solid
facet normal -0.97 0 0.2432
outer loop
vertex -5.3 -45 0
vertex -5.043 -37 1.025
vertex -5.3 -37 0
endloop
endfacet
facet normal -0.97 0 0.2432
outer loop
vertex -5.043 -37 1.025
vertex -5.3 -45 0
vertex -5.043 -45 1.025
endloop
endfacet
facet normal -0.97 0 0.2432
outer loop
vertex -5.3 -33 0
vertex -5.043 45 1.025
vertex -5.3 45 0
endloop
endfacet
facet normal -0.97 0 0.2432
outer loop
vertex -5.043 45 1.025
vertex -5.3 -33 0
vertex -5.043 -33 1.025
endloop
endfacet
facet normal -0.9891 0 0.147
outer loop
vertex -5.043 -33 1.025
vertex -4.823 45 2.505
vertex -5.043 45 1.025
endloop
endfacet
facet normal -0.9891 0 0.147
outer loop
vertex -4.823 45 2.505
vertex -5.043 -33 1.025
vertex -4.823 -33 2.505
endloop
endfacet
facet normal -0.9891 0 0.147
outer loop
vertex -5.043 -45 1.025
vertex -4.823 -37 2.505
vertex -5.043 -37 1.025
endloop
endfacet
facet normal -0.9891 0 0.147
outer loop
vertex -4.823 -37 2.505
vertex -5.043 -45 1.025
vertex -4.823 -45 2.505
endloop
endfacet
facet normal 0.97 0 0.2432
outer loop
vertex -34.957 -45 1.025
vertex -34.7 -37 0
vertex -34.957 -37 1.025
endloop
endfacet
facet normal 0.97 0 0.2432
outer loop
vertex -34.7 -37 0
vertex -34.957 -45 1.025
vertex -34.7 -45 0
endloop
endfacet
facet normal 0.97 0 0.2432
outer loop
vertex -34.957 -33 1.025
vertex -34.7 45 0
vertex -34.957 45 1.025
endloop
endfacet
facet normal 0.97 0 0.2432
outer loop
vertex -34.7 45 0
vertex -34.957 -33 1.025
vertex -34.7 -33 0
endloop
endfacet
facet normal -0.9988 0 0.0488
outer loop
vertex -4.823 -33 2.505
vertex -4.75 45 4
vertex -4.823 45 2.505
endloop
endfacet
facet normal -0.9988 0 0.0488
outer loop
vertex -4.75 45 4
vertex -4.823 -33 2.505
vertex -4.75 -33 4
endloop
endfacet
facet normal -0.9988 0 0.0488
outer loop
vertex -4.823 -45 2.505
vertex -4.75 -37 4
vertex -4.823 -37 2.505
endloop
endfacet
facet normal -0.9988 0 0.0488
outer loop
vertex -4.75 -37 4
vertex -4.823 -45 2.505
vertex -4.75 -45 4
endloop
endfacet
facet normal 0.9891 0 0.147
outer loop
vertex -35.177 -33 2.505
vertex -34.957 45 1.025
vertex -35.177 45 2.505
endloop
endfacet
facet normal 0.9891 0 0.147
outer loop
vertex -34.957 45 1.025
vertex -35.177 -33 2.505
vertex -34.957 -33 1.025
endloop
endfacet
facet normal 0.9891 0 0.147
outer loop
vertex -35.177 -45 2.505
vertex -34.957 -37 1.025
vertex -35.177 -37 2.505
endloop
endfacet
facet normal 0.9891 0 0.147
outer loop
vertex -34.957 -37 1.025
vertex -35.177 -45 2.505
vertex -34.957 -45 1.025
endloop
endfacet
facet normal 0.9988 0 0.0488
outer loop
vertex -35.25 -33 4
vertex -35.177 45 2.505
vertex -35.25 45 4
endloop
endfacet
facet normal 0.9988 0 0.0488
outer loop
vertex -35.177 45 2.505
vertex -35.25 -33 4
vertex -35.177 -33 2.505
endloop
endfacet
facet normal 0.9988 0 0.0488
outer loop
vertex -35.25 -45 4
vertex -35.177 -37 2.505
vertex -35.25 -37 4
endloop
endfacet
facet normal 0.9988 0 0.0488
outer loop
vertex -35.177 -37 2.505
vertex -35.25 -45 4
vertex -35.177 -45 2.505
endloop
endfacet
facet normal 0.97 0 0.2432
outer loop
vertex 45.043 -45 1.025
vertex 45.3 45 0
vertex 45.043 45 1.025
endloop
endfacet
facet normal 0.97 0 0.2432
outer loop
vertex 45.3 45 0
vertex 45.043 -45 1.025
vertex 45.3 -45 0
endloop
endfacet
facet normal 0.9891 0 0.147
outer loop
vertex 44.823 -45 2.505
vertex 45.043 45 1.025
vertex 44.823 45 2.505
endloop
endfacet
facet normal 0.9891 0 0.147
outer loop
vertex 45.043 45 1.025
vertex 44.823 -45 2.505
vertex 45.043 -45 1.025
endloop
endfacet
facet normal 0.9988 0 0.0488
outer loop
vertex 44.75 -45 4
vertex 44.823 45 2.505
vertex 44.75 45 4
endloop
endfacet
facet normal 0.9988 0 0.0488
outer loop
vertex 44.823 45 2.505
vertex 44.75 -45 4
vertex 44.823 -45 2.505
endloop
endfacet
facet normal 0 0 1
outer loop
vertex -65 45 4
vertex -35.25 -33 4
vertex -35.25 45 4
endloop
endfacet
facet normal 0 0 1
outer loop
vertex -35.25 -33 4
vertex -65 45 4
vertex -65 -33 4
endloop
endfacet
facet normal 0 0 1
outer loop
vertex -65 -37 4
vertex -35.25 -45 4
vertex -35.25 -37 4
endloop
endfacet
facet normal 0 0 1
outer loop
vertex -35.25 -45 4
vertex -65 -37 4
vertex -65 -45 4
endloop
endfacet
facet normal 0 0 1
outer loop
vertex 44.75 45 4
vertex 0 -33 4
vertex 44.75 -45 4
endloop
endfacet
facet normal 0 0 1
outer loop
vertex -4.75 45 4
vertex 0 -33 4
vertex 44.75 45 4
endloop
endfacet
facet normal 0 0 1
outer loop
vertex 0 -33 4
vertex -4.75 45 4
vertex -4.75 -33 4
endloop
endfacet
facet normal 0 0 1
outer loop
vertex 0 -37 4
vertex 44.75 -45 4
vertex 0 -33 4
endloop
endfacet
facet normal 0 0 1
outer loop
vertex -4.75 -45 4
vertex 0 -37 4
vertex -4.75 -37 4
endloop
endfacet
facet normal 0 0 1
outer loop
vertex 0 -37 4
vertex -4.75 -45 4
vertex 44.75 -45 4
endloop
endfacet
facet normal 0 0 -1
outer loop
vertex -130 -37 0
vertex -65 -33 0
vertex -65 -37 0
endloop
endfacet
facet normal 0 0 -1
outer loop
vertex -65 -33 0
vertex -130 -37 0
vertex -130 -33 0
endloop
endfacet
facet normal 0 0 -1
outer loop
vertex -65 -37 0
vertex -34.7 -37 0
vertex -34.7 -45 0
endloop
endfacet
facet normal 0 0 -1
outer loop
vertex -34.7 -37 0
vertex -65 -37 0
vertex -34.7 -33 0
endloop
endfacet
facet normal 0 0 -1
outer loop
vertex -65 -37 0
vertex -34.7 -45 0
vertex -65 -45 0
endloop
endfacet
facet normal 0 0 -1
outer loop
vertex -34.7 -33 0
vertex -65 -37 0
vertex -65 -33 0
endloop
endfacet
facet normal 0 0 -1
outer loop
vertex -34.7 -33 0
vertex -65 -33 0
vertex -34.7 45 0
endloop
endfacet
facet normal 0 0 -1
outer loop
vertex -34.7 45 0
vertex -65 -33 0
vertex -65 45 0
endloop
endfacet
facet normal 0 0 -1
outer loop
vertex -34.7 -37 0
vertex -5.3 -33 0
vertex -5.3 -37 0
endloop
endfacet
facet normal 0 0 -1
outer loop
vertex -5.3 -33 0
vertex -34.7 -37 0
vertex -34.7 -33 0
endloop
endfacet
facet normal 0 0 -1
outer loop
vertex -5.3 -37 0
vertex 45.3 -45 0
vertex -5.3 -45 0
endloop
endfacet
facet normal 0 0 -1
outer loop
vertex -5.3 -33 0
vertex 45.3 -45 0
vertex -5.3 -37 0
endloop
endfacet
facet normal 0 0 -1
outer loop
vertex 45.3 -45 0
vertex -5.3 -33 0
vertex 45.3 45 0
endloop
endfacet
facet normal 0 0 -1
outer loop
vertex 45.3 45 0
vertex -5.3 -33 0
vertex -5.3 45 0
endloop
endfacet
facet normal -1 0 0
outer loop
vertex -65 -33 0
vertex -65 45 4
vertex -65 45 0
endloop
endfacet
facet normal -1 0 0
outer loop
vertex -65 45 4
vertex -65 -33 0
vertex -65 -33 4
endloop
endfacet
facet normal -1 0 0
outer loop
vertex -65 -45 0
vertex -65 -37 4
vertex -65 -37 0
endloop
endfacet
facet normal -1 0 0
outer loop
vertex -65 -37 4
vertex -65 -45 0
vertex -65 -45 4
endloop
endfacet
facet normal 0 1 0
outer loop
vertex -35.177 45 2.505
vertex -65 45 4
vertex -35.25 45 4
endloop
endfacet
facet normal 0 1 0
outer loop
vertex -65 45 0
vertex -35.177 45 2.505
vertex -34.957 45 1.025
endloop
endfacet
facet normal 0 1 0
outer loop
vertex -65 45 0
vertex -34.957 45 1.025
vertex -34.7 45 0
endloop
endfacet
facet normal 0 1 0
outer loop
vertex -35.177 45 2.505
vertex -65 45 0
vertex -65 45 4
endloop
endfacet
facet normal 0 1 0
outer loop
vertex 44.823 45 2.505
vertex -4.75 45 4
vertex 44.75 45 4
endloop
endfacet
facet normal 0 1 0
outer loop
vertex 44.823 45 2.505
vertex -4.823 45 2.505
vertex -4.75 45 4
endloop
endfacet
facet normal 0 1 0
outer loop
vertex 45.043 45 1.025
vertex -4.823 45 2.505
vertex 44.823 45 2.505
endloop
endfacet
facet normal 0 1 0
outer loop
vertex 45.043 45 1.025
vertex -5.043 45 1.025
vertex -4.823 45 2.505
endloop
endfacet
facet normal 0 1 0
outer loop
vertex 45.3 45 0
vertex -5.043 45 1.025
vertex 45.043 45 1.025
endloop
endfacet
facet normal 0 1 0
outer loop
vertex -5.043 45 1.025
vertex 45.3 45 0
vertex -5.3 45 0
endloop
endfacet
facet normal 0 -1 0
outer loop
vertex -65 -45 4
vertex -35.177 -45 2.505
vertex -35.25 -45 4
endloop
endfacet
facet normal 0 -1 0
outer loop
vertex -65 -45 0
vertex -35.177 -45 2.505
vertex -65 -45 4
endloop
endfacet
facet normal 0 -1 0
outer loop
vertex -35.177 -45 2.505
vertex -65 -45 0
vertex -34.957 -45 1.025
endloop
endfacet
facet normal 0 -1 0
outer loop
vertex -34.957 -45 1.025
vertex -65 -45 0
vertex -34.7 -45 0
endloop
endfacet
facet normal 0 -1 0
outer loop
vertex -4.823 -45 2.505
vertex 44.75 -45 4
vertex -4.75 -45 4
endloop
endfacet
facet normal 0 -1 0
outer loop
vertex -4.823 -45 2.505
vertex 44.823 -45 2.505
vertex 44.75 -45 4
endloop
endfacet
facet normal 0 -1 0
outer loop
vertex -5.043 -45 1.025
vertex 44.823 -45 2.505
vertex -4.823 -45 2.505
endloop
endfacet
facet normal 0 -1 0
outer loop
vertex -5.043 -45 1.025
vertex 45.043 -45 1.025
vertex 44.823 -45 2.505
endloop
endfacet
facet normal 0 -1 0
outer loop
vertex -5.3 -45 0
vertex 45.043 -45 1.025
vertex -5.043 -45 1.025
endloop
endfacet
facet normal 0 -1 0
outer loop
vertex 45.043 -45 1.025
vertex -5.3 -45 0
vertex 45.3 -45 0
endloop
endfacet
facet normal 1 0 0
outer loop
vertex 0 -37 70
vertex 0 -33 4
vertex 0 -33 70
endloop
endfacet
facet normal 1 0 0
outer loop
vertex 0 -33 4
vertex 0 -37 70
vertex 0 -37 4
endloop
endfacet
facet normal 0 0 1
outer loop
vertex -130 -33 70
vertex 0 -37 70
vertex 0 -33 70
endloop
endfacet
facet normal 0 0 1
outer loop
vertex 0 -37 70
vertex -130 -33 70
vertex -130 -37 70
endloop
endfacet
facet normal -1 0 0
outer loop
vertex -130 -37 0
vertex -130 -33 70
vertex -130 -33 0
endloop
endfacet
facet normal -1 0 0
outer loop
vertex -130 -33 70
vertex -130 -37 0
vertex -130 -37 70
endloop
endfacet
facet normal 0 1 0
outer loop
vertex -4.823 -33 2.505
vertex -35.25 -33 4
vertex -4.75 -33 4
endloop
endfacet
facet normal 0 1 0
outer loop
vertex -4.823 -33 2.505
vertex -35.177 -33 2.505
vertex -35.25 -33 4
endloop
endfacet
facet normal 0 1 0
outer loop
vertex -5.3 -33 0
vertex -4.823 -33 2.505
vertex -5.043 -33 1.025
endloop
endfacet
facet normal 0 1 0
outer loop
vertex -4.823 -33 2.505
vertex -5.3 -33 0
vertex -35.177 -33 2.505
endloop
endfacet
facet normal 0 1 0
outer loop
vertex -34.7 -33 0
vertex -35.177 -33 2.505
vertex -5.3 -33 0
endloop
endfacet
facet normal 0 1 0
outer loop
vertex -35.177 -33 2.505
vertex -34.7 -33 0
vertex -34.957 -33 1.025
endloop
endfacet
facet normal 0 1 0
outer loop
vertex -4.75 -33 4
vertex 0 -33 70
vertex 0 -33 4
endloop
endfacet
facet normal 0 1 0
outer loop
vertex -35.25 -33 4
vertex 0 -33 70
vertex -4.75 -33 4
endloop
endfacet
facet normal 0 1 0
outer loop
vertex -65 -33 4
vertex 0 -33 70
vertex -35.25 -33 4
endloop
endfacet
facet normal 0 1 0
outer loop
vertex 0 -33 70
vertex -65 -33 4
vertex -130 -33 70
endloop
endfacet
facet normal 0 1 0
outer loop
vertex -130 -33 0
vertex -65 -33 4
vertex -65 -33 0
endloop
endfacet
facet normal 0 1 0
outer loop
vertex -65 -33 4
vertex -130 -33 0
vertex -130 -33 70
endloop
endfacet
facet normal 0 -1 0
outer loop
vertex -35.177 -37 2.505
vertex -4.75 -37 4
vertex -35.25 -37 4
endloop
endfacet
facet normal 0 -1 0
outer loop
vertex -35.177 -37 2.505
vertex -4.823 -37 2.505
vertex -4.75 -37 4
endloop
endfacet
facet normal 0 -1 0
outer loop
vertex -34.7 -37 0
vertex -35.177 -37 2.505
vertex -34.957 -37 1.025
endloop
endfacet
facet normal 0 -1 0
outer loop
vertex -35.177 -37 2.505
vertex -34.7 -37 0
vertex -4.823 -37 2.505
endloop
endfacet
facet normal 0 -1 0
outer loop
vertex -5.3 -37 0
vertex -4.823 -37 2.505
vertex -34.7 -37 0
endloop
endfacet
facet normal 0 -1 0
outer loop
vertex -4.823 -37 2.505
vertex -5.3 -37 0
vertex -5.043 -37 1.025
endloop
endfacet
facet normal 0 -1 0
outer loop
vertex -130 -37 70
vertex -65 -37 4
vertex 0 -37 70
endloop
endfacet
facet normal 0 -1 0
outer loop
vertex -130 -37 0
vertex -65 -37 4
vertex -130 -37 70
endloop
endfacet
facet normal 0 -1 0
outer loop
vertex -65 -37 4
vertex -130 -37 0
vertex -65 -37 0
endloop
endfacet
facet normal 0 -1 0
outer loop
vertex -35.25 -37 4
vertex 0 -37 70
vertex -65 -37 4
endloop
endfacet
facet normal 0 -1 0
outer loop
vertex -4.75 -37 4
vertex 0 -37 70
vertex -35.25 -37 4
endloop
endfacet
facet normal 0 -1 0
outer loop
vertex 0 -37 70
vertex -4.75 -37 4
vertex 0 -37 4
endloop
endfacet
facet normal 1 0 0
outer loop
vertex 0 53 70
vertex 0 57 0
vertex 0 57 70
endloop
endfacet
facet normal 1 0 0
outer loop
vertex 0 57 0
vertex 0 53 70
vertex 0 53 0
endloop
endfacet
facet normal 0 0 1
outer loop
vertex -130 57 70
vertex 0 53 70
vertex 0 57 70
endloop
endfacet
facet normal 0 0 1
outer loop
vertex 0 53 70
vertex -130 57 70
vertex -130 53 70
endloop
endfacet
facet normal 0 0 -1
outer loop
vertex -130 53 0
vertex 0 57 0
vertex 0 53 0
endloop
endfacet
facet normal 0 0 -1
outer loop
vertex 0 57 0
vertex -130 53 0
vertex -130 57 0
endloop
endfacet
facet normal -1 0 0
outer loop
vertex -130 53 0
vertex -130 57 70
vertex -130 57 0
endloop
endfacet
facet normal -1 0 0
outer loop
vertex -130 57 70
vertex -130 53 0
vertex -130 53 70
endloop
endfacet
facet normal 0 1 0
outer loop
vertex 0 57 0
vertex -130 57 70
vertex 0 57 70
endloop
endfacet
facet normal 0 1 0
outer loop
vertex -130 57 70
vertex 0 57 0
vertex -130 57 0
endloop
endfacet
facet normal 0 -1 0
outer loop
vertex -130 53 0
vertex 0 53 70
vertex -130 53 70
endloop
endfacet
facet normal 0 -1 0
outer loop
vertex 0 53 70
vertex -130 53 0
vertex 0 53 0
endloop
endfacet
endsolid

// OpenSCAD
// Built by bench/smallmodels/features/compiler.py from a list of features.
$fn = 64;
difference() {
  union() {
    translate([0, 0, 0]) translate([-65, -45, 0]) cube([130, 90, 4]);
  }
  union() {
    translate([-20, -20.5, 4]) rotate([0, 0, 0]) rotate([90, 0, 0]) cylinder(d = 30.5, h = 1016, center = true);
    translate([60, -20.5, 4]) rotate([0, 0, 0]) rotate([90, 0, 0]) cylinder(d = 30.5, h = 1016, center = true);
    translate([100, -20.5, 4]) rotate([0, 0, 0]) rotate([90, 0, 0]) cylinder(d = 30.5, h = 1016, center = true);
    translate([-20, 20.5, 4]) rotate([0, 0, 0]) rotate([90, 0, 0]) cylinder(d = 30.5, h = 1016, center = true);
    translate([60, 20.5, 4]) rotate([0, 0, 0]) rotate([90, 0, 0]) cylinder(d = 30.5, h = 1016, center = true);
    translate([100, 20.5, 4]) rotate([0, 0, 0]) rotate([90, 0, 0]) cylinder(d = 30.5, h = 1016, center = true);
  }
}
union() {
    translate([-65, -35, 0]) translate([-65, -2, 0]) cube([130, 4, 70]);
    translate([-65, 55, 0]) translate([-65, -2, 0]) cube([130, 4, 70]);
  }
